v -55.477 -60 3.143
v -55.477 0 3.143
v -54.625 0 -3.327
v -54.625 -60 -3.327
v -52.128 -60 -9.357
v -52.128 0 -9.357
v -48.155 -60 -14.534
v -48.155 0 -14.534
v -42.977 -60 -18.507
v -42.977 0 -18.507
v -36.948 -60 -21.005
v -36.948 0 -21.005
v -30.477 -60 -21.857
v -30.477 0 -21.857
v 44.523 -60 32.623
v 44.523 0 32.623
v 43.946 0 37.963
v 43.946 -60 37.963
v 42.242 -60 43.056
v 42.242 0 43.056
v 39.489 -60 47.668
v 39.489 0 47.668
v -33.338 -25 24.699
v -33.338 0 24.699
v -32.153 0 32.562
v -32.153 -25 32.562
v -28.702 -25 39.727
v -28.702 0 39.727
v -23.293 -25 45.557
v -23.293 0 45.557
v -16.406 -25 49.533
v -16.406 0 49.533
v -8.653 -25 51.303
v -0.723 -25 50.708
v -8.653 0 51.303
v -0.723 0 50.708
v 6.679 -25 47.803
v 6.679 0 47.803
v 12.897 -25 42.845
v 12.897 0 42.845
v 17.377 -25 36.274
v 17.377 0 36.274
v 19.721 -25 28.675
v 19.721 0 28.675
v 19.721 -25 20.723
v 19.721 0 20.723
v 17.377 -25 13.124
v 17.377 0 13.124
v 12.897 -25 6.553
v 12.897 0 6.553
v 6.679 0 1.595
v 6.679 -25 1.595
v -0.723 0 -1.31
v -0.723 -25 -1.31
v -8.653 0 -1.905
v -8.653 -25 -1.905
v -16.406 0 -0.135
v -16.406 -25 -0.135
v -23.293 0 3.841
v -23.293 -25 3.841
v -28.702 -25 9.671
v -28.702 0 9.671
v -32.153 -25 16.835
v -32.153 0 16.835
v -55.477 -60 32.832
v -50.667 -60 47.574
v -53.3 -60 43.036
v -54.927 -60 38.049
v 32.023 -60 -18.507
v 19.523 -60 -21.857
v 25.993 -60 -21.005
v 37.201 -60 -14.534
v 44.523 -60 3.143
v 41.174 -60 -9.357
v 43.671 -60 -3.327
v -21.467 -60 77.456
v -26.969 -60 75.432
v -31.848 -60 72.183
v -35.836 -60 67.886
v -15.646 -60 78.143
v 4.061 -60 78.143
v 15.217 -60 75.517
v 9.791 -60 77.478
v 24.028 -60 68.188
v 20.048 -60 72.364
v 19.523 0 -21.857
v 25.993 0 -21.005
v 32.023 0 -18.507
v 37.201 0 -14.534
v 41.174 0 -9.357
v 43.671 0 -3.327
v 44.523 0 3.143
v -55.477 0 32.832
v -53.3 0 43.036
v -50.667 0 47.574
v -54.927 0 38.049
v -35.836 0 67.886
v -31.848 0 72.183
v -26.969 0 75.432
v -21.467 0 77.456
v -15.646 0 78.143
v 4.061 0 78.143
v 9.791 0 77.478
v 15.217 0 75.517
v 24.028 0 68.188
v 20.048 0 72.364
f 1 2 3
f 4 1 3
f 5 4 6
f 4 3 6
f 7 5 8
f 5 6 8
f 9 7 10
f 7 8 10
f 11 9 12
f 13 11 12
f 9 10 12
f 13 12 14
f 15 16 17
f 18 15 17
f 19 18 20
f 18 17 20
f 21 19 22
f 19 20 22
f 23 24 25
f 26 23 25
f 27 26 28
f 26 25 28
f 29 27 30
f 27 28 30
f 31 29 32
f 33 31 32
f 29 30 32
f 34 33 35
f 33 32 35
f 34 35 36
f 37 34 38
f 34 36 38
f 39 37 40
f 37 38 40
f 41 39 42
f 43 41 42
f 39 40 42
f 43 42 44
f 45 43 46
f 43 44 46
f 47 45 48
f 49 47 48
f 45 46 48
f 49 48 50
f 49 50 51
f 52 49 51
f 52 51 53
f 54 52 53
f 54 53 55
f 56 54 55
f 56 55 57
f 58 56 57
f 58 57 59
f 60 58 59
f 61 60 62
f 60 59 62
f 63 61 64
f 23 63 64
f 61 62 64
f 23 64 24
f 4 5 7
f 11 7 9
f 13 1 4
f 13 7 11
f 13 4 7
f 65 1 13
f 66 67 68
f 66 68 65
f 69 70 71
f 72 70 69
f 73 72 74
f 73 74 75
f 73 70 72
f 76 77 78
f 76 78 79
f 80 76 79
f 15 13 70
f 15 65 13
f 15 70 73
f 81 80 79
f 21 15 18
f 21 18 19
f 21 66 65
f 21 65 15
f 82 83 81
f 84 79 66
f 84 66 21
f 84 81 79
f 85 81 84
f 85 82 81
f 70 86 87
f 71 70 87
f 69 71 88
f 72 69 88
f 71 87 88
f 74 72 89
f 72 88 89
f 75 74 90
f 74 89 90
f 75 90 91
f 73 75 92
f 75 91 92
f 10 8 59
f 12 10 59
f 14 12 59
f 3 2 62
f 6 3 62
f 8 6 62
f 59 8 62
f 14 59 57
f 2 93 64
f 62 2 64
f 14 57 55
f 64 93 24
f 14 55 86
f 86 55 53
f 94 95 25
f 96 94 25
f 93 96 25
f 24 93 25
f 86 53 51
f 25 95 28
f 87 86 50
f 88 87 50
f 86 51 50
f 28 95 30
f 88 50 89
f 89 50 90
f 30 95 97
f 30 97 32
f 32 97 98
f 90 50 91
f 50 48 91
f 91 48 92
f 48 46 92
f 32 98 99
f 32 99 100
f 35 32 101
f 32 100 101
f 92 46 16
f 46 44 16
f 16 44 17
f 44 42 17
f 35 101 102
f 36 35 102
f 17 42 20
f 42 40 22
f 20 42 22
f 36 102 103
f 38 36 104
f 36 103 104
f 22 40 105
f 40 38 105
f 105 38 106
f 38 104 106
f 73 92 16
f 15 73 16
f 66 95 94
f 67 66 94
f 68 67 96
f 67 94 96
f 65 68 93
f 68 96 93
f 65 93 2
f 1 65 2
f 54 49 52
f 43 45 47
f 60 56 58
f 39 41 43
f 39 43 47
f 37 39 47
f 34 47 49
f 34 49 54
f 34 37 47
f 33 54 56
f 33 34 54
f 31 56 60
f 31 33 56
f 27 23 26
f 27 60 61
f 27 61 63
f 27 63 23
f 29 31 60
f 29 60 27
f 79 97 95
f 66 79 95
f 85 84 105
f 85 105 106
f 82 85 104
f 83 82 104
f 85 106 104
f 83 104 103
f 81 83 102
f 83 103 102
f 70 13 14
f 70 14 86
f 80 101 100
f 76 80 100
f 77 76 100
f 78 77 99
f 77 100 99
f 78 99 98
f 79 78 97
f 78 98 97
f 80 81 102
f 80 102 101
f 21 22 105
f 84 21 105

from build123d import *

# Parameters (mm, degrees)
F1_DEPTH = 60
F2_R     = 26.678258
F3_DEPTH = 25


with BuildPart() as f1:
    # F0 (on Front) → F1 (new body)
    with BuildSketch(Plane.XZ):
        with BuildLine():
            Line((4.061145, 78.143452), (-15.64565, 78.143452))
            ThreePointArc((-15.64565, 78.143452), (-26.968879, 75.432115), (-35.83602, 67.886212))
            Line((-35.83602, 67.886212), (-50.667426, 47.57444))
            ThreePointArc((-50.667426, 47.57444), (-54.244252, 40.585414), (-55.477056, 32.831681))
            Line((-55.477056, 32.831681), (-55.477056, 3.143452))
            ThreePointArc((-55.477056, 3.143452), (-48.154725, -14.534217), (-30.477056, -21.856548))
            Line((-30.477056, -21.856548), (19.522944, -21.856548))
            ThreePointArc((19.522944, -21.856548), (37.200614, -14.534217), (44.522944, 3.143452))
            Line((44.522944, 3.143452), (44.522944, 32.623266))
            ThreePointArc((44.522944, 32.623266), (43.231192, 40.555414), (39.489426, 47.667853))
            Line((39.489426, 47.667853), (24.027628, 68.188039))
            ThreePointArc((24.027628, 68.188039), (15.216533, 75.516591), (4.061145, 78.143452))
        make_face()
    extrude(amount=F1_DEPTH)

    # F2 (on face) → F3 (cut)
    with BuildSketch(Plane(origin=(0, 0, 0), x_dir=(-1, 0, 0), z_dir=(0, 1, 0))):
        with Locations((6.659664, 24.698926)):
            Circle(F2_R)
    extrude(amount=-F3_DEPTH, mode=Mode.SUBTRACT)


solid = f1.part
